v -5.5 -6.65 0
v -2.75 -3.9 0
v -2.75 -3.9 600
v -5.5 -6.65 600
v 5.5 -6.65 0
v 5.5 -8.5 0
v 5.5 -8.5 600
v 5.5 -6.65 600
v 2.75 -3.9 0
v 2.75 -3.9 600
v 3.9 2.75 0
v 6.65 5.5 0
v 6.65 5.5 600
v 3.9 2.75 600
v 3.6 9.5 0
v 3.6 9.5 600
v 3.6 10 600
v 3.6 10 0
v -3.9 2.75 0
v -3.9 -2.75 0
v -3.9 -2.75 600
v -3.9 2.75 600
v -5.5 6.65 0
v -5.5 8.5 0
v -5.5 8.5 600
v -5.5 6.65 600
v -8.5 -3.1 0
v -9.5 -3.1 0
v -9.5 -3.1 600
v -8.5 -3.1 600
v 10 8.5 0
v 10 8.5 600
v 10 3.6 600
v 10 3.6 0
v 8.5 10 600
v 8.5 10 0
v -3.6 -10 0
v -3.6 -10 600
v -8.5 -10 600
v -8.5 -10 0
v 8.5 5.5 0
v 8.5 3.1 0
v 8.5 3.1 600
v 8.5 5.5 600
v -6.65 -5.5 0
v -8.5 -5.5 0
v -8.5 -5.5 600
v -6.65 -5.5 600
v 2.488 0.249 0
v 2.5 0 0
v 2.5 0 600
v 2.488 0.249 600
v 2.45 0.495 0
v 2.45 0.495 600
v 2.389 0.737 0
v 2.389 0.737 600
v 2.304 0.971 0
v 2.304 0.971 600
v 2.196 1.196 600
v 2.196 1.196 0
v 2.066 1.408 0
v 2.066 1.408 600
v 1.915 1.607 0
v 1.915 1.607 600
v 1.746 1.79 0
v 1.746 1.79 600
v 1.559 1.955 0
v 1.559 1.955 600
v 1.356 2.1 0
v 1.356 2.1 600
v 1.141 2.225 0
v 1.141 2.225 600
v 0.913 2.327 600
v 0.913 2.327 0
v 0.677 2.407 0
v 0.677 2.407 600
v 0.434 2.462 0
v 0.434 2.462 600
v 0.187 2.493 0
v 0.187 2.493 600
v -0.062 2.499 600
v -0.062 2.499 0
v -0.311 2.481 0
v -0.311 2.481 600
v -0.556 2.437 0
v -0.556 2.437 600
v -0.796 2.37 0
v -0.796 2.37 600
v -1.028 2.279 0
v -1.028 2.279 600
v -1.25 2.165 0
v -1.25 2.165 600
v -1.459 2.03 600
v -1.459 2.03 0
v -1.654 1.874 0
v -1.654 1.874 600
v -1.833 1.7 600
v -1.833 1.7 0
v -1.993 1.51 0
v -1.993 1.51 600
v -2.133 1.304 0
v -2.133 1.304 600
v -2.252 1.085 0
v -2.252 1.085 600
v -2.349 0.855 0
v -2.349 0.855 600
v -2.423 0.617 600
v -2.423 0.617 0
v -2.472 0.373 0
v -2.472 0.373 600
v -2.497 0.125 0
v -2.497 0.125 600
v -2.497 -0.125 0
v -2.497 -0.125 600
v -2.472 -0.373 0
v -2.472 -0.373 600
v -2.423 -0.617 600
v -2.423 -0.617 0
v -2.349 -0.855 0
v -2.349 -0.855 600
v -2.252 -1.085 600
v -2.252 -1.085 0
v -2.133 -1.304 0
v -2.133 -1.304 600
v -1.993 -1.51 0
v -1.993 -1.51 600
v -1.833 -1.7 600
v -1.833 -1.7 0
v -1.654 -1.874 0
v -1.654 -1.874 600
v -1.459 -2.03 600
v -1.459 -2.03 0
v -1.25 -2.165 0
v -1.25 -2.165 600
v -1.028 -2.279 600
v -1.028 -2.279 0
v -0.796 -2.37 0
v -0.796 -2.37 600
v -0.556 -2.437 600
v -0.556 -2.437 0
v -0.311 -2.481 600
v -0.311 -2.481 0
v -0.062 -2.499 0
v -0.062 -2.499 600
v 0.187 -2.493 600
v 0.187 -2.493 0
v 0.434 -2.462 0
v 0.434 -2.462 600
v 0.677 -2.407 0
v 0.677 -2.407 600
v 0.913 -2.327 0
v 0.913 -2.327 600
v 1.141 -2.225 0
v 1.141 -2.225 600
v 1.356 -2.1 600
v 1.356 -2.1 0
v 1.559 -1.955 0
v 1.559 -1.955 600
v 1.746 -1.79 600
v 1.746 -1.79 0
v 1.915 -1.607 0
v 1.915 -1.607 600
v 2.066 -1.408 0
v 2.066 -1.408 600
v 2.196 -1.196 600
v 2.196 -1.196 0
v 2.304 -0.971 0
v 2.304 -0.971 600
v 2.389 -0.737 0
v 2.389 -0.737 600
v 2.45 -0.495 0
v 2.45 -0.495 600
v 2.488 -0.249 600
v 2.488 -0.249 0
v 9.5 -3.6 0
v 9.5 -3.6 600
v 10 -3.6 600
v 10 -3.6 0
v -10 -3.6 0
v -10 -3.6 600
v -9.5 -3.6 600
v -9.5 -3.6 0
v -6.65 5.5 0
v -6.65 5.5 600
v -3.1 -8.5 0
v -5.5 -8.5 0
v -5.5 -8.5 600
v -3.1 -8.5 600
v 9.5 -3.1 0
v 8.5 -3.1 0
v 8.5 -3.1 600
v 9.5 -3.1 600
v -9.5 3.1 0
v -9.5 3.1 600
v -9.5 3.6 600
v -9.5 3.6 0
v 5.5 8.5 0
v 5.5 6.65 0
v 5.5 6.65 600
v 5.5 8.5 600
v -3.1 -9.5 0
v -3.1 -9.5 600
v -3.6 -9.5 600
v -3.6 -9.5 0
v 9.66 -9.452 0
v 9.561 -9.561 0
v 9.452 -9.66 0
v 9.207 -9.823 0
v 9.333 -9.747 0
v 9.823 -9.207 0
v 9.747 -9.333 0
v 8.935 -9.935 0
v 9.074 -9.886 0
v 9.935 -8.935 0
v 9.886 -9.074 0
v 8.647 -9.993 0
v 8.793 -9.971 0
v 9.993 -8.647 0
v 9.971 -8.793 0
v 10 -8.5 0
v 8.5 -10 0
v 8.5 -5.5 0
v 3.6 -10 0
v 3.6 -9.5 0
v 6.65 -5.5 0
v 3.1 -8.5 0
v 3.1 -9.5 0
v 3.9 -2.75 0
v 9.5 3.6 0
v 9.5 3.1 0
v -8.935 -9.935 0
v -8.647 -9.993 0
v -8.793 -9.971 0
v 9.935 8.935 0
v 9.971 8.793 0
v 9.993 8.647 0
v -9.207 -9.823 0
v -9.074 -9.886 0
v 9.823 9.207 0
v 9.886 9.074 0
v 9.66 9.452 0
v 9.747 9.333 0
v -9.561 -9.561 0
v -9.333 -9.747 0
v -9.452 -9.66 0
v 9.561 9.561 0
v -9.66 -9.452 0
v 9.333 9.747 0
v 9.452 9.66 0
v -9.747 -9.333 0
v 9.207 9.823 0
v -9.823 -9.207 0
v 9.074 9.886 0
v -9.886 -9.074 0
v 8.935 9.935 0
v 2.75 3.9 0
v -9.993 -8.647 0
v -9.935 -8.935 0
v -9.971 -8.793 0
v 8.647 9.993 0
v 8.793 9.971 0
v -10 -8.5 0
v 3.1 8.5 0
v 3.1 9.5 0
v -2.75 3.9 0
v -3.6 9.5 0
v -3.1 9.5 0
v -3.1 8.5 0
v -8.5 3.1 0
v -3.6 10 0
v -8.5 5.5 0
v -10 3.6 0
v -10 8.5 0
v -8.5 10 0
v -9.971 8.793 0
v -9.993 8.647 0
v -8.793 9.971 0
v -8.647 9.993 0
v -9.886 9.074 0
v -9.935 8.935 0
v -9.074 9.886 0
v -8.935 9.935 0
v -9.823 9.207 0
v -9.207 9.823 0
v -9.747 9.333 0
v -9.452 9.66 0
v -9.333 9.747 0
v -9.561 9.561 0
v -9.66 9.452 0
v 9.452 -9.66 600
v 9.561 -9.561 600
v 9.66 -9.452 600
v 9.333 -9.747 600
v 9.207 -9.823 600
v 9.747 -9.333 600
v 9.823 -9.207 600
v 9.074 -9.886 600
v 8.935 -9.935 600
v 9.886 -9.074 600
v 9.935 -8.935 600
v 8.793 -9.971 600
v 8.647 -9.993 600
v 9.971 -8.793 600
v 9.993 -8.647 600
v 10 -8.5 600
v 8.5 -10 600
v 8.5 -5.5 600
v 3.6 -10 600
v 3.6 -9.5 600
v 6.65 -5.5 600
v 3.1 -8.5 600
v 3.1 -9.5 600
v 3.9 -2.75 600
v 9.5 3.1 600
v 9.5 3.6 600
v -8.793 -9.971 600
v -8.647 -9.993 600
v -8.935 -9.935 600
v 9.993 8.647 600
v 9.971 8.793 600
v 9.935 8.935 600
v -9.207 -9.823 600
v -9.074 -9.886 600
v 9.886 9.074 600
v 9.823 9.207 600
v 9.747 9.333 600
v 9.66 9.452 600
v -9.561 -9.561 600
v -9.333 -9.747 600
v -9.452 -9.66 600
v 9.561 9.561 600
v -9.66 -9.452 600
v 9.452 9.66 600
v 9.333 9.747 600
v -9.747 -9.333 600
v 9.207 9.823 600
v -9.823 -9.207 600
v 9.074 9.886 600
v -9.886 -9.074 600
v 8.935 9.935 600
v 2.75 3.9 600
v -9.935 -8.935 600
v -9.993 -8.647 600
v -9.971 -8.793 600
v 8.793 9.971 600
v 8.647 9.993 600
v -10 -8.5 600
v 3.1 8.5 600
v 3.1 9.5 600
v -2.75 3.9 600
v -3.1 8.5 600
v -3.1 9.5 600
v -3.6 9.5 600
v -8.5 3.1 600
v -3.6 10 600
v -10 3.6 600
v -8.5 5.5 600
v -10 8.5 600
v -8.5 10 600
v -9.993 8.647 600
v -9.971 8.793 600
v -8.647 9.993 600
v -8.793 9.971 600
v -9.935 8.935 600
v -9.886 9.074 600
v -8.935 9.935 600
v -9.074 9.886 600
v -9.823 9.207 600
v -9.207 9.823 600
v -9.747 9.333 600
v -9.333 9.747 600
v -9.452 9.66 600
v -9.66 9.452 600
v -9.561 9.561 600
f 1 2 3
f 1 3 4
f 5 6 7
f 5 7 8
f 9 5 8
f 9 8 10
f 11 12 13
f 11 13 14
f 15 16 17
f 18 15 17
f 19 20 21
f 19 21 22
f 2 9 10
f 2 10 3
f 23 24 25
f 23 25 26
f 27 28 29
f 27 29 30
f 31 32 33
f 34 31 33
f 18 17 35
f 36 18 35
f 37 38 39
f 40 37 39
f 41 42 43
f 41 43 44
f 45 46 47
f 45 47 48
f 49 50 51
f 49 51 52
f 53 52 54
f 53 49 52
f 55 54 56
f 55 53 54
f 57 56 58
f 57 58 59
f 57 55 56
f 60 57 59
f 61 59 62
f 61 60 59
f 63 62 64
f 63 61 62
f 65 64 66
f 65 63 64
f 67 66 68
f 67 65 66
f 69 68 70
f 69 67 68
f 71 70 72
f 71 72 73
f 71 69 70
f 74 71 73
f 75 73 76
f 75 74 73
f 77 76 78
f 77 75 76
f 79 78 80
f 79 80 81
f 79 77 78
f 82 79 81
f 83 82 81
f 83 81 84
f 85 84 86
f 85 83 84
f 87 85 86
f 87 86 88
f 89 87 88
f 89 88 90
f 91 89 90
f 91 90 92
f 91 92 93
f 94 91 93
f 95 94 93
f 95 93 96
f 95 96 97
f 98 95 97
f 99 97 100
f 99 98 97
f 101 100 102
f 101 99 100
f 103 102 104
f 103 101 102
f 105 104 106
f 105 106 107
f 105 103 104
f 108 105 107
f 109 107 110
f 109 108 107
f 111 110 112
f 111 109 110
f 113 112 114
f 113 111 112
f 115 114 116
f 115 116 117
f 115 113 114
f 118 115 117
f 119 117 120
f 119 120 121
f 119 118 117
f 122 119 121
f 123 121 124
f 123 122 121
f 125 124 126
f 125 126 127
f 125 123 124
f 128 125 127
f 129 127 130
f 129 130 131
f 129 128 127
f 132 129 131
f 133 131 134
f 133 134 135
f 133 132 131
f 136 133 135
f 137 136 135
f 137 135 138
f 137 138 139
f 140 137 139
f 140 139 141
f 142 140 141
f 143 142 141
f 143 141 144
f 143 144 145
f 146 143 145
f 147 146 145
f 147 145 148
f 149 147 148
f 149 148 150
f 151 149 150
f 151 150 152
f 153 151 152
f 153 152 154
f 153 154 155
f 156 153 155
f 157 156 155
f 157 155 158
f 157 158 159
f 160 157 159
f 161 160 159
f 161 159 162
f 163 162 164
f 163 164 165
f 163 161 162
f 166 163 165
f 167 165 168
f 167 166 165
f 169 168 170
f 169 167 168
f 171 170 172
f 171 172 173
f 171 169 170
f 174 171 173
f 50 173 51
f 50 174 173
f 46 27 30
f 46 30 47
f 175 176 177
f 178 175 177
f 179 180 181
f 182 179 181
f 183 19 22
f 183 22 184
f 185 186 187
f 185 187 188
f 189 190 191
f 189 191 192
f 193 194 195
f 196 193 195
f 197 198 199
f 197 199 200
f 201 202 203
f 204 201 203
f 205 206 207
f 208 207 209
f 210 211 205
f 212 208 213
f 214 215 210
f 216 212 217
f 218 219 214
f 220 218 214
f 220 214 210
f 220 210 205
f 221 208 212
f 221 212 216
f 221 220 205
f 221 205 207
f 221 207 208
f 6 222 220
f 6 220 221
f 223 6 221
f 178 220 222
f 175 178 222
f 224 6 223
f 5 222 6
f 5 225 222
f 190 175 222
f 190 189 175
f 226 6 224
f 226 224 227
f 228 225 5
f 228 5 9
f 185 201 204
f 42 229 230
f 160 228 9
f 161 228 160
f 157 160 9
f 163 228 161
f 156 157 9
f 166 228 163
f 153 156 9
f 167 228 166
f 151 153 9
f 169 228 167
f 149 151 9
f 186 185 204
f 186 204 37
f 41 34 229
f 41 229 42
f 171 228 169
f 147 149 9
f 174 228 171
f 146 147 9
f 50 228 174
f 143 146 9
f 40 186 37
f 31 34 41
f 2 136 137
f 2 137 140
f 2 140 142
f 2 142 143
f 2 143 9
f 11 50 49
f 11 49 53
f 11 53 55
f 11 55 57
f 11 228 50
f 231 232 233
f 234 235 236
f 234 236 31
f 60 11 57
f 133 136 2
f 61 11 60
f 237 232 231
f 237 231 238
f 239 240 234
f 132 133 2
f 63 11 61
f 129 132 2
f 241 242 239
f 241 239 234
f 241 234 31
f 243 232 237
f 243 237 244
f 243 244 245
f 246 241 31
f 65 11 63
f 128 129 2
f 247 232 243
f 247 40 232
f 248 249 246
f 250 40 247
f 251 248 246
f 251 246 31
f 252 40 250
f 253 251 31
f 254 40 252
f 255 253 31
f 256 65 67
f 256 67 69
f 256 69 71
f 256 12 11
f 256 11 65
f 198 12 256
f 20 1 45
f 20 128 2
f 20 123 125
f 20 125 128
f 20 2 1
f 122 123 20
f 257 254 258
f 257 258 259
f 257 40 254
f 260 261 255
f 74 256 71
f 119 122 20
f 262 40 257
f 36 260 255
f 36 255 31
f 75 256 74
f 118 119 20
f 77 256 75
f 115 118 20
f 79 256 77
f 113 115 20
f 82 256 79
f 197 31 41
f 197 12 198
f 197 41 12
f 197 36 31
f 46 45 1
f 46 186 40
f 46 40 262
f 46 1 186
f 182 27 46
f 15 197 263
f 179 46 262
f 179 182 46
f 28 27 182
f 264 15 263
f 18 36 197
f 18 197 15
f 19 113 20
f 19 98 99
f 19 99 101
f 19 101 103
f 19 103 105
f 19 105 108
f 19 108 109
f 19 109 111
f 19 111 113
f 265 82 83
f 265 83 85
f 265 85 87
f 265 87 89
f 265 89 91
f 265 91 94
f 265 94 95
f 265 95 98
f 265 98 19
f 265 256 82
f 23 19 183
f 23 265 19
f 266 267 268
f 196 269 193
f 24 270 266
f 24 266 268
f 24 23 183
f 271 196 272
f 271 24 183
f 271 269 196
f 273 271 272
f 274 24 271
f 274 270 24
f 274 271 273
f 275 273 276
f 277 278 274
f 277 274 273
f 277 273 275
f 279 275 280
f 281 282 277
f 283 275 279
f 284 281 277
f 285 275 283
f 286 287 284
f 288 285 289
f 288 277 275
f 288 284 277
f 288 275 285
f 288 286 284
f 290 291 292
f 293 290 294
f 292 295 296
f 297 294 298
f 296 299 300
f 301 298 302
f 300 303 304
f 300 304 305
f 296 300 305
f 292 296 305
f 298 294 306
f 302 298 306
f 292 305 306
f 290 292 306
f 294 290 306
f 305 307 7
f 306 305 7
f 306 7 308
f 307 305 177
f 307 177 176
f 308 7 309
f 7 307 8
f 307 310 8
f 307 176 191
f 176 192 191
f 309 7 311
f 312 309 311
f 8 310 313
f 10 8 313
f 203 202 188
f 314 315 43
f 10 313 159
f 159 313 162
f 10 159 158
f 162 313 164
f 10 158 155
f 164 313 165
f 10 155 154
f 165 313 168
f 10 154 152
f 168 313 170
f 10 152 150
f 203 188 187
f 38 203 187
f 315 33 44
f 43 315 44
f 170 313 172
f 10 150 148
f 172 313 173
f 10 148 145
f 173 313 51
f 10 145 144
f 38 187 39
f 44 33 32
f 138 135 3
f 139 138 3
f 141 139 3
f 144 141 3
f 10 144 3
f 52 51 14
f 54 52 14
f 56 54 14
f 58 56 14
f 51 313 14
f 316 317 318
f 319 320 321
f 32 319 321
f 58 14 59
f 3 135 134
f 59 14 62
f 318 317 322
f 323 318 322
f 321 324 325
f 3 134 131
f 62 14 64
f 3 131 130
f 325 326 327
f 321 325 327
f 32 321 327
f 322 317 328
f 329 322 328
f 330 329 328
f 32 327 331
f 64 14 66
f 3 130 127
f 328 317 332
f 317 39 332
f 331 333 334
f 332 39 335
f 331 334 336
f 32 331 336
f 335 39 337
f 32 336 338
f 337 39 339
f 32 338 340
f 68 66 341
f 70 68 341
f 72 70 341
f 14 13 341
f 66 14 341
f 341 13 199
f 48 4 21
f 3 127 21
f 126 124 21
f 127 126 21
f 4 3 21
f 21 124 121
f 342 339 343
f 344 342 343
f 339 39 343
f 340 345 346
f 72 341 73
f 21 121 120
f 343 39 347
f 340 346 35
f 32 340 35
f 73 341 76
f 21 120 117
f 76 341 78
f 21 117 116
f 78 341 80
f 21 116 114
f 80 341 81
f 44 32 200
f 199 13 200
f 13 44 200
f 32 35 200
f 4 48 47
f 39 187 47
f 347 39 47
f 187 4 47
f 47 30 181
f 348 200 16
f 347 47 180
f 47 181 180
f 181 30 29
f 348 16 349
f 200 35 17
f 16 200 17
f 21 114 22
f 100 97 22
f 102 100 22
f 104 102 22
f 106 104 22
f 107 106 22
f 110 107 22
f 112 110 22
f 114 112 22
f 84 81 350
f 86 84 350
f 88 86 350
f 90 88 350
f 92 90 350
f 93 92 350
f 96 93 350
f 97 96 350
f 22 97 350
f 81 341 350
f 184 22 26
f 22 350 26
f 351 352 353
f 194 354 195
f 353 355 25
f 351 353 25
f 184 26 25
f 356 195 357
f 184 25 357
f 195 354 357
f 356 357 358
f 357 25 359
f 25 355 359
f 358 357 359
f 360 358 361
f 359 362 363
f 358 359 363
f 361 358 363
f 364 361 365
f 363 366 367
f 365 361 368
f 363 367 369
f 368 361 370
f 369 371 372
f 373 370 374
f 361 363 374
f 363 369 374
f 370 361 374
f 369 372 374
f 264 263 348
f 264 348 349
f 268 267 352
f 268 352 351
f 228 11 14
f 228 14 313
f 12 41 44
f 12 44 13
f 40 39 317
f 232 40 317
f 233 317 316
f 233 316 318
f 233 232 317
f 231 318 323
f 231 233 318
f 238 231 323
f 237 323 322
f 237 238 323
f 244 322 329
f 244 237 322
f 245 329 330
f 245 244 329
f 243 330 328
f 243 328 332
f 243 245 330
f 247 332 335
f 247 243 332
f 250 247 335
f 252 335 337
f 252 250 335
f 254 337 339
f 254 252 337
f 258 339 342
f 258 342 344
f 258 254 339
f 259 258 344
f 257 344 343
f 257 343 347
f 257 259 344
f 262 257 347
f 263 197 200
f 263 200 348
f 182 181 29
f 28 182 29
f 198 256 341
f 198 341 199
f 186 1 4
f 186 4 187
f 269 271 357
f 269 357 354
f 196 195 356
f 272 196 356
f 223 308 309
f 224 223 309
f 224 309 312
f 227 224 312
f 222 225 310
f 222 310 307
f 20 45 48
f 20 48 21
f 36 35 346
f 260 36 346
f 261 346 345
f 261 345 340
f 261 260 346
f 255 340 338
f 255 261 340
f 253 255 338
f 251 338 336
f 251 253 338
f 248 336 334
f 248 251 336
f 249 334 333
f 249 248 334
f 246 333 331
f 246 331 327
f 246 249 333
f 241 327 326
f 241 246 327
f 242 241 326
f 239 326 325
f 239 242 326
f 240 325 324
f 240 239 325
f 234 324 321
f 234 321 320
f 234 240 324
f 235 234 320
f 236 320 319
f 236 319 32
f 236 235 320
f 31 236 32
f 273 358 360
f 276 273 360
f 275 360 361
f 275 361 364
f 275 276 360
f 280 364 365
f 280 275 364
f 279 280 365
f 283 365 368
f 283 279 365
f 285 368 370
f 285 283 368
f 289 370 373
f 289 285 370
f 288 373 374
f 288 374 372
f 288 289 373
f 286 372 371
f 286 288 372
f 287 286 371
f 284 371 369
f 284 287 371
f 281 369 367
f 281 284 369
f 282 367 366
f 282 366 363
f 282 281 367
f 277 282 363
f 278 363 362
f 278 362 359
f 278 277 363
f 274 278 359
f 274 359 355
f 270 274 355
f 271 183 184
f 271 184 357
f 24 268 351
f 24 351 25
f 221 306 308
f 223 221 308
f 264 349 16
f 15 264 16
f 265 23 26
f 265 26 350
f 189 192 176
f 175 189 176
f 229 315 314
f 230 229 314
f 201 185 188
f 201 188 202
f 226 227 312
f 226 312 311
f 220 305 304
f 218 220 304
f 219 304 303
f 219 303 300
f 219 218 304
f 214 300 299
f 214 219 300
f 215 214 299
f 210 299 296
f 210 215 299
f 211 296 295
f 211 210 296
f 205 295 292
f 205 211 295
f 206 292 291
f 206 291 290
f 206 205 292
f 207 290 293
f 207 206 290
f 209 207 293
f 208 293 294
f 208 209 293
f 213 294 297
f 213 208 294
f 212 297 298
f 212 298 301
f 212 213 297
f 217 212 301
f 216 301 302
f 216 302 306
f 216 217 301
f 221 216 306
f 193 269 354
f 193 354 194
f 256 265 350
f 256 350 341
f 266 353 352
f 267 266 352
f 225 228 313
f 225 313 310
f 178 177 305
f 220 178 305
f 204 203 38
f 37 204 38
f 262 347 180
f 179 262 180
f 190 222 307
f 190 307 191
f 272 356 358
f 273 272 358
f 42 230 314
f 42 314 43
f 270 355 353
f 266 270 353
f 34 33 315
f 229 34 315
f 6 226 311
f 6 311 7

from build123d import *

# Parameters (mm, degrees)
SKETCH_1_R      = 2.5
EXTRUDE_1_DEPTH = 600


with BuildPart() as part:
    # 草图1 → 凸台-拉伸1 (new body)
    with BuildSketch(Plane.XY):
        with BuildLine():
            Line((-3.6, 10), (-3.6, 9.5))
            Line((-3.6, 9.5), (-3.1, 9.5))
            Line((-3.1, 9.5), (-3.1, 8.5))
            Line((-3.1, 8.5), (-5.5, 8.5))
            Line((-5.5, 8.5), (-5.5, 6.65))
            Line((-5.5, 6.65), (-2.75, 3.9))
            Line((-2.75, 3.9), (2.75, 3.9))
            Line((2.75, 3.9), (5.5, 6.65))
            Line((5.5, 6.65), (5.5, 8.5))
            Line((5.5, 8.5), (3.1, 8.5))
            Line((3.1, 8.5), (3.1, 9.5))
            Line((3.1, 9.5), (3.6, 9.5))
            Line((3.6, 9.5), (3.6, 10))
            Line((3.6, 10), (8.5, 10))
            ThreePointArc((8.5, 10), (9.560660172, 9.560660172), (10, 8.5))
            Line((10, 8.5), (10, 3.6))
            Line((10, 3.6), (9.5, 3.6))
            Line((9.5, 3.6), (9.5, 3.1))
            Line((9.5, 3.1), (8.5, 3.1))
            Line((8.5, 3.1), (8.5, 5.5))
            Line((8.5, 5.5), (6.65, 5.5))
            Line((6.65, 5.5), (3.9, 2.75))
            Line((3.9, 2.75), (3.9, -2.75))
            Line((3.9, -2.75), (6.65, -5.5))
            Line((6.65, -5.5), (8.5, -5.5))
            Line((8.5, -5.5), (8.5, -3.1))
            Line((8.5, -3.1), (9.5, -3.1))
            Line((9.5, -3.1), (9.5, -3.6))
            Line((9.5, -3.6), (10, -3.6))
            Line((10, -3.6), (10, -8.5))
            ThreePointArc((10, -8.5), (9.560660172, -9.560660172), (8.5, -10))
            Line((8.5, -10), (3.6, -10))
            Line((3.6, -10), (3.6, -9.5))
            Line((3.6, -9.5), (3.1, -9.5))
            Line((3.1, -9.5), (3.1, -8.5))
            Line((3.1, -8.5), (5.5, -8.5))
            Line((5.5, -8.5), (5.5, -6.65))
            Line((5.5, -6.65), (2.75, -3.9))
            Line((2.75, -3.9), (-2.75, -3.9))
            Line((-2.75, -3.9), (-5.5, -6.65))
            Line((-5.5, -6.65), (-5.5, -8.5))
            Line((-5.5, -8.5), (-3.1, -8.5))
            Line((-3.1, -8.5), (-3.1, -9.5))
            Line((-3.1, -9.5), (-3.6, -9.5))
            Line((-3.6, -9.5), (-3.6, -10))
            Line((-3.6, -10), (-8.5, -10))
            ThreePointArc((-8.5, -10), (-9.560660172, -9.560660172), (-10, -8.5))
            Line((-10, -8.5), (-10, -3.6))
            Line((-10, -3.6), (-9.5, -3.6))
            Line((-9.5, -3.6), (-9.5, -3.1))
            Line((-9.5, -3.1), (-8.5, -3.1))
            Line((-8.5, -3.1), (-8.5, -5.5))
            Line((-8.5, -5.5), (-6.65, -5.5))
            Line((-6.65, -5.5), (-3.9, -2.75))
            Line((-3.9, -2.75), (-3.9, 2.75))
            Line((-3.9, 2.75), (-6.65, 5.5))
            Line((-6.65, 5.5), (-8.5, 5.5))
            Line((-8.5, 5.5), (-8.5, 3.1))
            Line((-8.5, 3.1), (-9.5, 3.1))
            Line((-9.5, 3.1), (-9.5, 3.6))
            Line((-9.5, 3.6), (-10, 3.6))
            Line((-10, 3.6), (-10, 8.5))
            ThreePointArc((-10, 8.5), (-9.560660172, 9.560660172), (-8.5, 10))
            Line((-8.5, 10), (-3.6, 10))
        make_face()
        Circle(SKETCH_1_R, mode=Mode.SUBTRACT)
    extrude(amount=EXTRUDE_1_DEPTH)


solid = part.part
